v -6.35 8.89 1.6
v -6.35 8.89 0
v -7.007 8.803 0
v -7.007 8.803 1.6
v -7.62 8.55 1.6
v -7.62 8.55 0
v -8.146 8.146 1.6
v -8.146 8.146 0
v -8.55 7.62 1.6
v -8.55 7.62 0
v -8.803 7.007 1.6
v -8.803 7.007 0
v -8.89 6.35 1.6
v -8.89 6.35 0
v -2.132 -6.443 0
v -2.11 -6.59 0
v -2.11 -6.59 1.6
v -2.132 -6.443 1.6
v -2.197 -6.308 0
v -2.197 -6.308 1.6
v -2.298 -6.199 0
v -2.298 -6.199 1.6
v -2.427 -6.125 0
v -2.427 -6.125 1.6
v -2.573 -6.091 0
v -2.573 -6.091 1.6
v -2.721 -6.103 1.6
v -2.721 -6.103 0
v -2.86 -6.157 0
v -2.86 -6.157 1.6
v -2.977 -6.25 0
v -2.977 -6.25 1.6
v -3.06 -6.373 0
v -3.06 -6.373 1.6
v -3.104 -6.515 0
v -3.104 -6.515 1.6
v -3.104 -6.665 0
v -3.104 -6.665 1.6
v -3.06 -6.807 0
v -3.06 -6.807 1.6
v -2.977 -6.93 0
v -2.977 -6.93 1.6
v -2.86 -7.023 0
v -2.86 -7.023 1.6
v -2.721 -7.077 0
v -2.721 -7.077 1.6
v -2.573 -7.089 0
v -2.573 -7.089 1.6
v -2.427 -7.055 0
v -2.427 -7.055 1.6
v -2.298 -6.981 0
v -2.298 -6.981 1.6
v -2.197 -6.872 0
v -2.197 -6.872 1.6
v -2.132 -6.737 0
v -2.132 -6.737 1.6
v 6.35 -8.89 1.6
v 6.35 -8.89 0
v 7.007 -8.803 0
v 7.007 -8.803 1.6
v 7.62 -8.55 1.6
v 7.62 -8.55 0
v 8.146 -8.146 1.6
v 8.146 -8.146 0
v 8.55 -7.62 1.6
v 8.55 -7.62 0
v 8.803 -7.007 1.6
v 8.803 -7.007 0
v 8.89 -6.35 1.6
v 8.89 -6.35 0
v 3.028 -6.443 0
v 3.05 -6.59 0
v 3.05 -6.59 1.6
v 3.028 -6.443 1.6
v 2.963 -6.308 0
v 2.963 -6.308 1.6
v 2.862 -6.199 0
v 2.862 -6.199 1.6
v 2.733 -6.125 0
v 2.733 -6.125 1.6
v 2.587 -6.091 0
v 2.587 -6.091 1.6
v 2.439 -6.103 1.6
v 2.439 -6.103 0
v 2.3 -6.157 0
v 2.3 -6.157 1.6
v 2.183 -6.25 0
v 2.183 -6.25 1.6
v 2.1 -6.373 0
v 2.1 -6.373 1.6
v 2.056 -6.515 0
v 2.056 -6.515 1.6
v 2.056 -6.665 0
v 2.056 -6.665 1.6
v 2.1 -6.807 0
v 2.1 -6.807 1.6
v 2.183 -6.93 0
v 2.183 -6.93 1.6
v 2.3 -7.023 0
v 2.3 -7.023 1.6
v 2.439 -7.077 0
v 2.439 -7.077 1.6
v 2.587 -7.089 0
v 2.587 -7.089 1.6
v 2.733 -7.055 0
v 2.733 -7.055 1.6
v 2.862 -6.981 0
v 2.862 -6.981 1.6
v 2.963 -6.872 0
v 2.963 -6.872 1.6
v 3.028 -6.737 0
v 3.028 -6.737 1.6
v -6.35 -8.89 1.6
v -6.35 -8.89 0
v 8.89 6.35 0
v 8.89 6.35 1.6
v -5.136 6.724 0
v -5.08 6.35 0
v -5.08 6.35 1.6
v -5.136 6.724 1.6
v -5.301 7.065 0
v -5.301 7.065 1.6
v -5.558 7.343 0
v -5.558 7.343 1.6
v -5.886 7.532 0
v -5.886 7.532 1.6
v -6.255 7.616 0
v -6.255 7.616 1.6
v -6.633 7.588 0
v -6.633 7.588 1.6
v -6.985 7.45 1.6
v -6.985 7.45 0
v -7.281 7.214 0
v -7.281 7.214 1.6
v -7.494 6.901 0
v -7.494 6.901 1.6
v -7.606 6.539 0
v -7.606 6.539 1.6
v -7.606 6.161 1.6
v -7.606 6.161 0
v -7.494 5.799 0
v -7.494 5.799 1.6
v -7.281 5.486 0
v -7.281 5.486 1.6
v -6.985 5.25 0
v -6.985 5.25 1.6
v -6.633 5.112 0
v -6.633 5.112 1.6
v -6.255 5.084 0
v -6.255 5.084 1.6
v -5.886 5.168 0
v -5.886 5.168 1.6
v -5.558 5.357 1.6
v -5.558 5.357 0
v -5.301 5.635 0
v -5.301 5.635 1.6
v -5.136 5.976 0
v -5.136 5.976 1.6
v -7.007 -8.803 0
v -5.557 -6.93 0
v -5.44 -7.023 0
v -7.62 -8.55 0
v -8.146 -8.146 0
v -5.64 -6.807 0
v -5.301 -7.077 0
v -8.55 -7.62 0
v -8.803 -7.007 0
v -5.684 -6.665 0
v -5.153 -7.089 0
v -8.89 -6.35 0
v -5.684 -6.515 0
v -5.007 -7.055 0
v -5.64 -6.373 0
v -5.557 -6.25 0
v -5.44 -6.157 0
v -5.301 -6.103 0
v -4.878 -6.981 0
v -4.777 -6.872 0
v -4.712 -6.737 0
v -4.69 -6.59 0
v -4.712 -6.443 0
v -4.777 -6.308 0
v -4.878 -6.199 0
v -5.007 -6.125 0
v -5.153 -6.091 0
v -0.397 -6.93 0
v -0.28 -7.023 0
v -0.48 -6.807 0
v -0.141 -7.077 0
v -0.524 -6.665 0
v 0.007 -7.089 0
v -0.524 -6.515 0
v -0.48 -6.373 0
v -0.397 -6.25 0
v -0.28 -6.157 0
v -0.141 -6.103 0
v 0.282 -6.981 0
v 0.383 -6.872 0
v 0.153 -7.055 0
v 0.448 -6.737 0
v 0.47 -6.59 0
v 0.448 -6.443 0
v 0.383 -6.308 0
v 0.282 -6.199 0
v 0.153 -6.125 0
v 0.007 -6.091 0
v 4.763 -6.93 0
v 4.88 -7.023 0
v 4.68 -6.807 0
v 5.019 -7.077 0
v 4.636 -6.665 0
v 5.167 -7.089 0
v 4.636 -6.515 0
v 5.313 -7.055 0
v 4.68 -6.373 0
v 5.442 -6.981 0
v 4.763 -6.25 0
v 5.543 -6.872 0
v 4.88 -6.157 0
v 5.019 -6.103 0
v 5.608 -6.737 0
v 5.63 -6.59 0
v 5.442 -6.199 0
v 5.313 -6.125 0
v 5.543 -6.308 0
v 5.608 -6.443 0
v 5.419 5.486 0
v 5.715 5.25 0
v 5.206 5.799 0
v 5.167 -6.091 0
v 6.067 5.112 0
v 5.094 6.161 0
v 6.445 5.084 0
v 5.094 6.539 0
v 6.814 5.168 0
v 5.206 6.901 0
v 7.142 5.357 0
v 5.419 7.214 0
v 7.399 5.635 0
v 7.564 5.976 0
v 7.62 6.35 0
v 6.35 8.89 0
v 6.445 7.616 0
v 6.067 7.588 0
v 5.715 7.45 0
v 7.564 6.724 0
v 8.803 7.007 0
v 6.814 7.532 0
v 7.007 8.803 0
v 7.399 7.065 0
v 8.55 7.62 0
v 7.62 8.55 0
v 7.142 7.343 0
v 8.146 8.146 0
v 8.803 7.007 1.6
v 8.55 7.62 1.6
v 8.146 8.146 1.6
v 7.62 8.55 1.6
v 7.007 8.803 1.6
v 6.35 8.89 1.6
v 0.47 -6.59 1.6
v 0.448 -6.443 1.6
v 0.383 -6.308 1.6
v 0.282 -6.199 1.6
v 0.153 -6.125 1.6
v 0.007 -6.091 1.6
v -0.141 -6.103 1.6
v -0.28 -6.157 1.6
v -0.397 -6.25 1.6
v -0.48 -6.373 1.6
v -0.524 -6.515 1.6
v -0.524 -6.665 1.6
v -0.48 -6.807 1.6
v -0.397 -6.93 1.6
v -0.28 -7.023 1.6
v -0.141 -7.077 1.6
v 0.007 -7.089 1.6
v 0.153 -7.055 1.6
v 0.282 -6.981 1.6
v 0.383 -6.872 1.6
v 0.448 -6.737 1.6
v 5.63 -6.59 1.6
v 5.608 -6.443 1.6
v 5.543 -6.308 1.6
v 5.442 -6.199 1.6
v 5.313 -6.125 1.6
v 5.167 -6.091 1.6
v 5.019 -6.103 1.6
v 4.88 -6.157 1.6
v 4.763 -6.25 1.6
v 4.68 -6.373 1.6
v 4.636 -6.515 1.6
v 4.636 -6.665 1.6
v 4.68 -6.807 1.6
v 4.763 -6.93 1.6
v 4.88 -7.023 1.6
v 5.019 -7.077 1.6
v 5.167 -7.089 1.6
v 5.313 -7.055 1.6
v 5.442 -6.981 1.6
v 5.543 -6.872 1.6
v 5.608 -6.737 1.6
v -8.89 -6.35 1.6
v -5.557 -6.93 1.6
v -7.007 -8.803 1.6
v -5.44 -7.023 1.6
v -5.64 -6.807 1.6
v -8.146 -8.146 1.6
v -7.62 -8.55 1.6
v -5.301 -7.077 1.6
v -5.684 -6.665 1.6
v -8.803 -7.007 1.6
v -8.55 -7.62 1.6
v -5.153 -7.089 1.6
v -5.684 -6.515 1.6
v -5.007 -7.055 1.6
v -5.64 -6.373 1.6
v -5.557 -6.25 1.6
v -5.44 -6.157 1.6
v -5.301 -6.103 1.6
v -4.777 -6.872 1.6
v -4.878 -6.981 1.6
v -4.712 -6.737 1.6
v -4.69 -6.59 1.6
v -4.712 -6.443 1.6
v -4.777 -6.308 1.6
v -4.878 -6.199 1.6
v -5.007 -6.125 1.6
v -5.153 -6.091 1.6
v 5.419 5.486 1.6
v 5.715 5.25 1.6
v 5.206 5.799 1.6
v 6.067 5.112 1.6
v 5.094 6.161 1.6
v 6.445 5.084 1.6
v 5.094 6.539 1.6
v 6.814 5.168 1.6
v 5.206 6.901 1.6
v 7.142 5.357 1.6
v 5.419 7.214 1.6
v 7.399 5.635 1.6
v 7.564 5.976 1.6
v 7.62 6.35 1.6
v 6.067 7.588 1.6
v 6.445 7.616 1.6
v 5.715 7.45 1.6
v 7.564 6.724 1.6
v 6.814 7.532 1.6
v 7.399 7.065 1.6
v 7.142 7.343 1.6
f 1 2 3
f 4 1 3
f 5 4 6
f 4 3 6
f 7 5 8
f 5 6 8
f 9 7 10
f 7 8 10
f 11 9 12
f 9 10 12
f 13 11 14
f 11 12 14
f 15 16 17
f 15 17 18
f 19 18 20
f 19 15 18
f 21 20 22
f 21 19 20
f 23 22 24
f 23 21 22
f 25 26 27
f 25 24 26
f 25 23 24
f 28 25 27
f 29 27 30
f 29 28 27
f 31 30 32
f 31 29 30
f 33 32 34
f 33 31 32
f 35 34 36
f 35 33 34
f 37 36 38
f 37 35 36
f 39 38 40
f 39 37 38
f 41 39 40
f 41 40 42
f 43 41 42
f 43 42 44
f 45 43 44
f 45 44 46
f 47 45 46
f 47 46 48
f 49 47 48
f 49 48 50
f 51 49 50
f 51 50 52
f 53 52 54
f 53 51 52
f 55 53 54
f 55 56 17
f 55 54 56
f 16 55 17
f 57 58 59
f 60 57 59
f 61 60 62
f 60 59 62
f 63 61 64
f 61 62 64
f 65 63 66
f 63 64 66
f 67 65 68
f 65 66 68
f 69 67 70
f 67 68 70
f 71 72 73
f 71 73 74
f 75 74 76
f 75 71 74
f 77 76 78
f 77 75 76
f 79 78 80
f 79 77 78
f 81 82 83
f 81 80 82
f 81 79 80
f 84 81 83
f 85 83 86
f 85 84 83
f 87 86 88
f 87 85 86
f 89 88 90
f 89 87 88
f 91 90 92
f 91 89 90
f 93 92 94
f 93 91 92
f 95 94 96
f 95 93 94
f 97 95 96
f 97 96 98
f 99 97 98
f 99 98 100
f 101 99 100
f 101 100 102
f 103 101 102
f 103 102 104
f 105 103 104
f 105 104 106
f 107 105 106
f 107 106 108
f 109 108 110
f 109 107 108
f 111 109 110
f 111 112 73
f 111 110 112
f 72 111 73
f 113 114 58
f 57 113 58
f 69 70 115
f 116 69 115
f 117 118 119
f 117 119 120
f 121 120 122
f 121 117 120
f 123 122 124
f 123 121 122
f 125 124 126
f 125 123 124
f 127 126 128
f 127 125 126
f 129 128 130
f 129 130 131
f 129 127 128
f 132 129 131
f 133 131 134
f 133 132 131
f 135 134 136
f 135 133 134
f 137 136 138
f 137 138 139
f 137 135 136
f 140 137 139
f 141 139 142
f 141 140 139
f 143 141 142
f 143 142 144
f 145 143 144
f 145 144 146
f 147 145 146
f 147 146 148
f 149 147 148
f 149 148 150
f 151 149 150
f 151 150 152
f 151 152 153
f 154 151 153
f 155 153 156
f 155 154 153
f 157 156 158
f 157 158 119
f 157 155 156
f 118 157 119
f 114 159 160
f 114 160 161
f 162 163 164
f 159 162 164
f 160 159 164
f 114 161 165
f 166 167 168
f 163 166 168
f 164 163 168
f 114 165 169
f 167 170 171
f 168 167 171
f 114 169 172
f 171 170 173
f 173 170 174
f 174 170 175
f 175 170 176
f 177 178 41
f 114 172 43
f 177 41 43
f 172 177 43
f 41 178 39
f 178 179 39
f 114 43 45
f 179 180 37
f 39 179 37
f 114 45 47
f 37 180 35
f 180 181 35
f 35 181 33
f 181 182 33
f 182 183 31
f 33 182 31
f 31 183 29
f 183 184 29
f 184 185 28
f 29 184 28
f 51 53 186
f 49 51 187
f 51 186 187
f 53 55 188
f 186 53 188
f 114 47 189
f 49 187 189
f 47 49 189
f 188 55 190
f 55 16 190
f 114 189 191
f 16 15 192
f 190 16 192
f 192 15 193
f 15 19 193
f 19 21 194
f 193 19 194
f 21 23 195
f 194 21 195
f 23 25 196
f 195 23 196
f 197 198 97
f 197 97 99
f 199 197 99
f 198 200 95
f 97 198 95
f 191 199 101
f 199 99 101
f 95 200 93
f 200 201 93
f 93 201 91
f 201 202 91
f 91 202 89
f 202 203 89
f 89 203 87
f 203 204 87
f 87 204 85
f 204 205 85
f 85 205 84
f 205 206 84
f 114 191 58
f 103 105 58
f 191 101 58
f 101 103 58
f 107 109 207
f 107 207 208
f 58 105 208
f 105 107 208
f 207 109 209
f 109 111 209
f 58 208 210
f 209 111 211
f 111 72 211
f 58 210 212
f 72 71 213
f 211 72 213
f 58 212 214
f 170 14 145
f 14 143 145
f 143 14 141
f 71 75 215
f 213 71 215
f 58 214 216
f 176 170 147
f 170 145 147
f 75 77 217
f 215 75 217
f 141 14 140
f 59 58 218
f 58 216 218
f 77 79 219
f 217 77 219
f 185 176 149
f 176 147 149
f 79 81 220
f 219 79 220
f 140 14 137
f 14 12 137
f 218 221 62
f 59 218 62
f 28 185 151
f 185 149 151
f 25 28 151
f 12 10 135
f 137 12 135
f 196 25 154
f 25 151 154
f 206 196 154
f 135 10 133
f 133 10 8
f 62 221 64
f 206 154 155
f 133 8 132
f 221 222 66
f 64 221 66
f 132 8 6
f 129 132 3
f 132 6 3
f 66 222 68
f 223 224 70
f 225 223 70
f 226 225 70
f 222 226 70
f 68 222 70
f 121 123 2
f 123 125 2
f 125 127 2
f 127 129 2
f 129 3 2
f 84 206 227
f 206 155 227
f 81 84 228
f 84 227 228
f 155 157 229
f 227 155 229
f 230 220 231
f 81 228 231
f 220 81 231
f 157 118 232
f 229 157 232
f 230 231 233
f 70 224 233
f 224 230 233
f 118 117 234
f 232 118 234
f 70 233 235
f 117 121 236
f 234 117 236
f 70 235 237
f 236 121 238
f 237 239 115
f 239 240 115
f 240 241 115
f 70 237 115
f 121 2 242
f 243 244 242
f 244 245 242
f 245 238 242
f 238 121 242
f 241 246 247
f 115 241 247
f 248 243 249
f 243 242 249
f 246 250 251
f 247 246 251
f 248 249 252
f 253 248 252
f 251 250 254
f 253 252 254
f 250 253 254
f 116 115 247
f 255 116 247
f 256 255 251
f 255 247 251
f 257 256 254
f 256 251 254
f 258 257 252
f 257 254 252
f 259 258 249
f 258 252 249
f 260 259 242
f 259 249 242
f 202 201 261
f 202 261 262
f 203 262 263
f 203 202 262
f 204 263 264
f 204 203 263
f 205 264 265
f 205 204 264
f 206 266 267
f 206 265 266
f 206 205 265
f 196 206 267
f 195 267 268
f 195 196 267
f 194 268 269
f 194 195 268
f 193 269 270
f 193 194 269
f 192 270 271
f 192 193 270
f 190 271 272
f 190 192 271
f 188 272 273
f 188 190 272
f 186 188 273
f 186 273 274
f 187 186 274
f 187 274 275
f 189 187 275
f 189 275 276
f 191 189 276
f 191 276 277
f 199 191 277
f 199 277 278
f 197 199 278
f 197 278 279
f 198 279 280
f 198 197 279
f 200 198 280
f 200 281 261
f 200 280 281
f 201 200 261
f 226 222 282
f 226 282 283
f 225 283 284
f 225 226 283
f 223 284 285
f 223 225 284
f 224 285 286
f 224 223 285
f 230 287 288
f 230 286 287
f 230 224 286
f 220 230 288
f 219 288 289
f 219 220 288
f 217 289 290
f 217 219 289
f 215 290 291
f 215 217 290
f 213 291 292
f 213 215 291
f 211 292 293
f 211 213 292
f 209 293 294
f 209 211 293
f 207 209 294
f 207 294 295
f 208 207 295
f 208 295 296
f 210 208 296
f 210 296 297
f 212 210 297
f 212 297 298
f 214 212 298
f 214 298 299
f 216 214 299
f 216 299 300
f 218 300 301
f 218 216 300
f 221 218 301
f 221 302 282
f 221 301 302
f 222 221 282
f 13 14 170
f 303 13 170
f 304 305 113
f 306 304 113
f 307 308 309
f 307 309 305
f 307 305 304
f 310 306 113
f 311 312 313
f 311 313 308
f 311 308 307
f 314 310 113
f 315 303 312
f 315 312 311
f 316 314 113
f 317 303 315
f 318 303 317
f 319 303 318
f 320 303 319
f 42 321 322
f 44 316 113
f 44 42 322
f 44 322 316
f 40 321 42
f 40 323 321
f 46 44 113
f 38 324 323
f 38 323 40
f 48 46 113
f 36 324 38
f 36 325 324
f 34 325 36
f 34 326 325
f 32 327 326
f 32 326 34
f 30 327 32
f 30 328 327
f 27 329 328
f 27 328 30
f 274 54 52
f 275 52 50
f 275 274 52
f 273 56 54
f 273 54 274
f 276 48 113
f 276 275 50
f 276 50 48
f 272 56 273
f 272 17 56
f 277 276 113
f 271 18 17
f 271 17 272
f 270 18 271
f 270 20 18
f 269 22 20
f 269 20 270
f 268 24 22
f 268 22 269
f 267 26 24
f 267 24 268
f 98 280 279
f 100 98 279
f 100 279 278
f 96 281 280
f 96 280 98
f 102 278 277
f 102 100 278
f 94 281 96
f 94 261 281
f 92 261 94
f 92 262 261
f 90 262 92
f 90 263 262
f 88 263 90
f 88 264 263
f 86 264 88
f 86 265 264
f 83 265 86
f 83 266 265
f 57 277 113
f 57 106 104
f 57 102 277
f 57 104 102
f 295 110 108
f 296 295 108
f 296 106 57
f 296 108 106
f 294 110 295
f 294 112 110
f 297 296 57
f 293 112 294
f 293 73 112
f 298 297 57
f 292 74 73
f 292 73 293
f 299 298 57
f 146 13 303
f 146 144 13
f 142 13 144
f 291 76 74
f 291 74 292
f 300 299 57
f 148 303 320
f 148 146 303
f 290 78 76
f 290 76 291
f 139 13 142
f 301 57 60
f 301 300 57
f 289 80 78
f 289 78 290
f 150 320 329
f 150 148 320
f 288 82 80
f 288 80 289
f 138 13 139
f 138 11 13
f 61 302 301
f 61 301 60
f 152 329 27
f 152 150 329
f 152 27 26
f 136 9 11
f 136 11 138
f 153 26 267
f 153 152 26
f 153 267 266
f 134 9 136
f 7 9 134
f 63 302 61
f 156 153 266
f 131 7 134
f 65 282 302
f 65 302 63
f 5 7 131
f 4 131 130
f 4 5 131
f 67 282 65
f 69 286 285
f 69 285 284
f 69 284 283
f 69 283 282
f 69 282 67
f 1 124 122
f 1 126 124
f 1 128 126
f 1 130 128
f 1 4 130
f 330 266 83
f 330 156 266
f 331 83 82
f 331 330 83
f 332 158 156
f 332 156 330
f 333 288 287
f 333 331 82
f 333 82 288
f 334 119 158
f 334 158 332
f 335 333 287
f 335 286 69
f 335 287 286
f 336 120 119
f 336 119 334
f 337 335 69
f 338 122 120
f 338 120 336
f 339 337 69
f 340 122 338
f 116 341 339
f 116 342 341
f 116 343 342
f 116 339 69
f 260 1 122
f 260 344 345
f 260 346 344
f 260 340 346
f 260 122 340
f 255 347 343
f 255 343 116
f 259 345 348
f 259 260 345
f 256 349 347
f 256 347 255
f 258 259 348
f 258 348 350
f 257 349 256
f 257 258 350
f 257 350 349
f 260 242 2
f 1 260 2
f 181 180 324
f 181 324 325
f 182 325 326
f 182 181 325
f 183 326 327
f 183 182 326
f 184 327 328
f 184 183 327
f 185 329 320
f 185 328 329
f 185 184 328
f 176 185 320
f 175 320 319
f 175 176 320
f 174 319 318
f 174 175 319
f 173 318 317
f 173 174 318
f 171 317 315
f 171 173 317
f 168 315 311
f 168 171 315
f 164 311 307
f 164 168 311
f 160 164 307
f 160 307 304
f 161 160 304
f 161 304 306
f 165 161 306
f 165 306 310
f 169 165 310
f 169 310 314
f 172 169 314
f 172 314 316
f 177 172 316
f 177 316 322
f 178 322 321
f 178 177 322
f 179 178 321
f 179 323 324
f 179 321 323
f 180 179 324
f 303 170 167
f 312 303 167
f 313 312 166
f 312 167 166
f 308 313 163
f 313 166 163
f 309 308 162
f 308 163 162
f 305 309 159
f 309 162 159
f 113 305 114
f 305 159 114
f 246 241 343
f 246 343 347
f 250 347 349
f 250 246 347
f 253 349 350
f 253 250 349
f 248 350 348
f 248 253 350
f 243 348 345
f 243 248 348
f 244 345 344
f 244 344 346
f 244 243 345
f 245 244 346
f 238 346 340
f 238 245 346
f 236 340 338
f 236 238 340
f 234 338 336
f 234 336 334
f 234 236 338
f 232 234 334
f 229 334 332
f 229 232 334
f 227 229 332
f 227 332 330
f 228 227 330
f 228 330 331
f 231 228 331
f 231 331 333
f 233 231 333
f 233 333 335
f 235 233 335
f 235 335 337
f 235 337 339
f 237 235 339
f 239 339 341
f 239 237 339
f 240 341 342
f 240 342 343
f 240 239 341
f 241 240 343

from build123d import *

# Parameters (mm, degrees)
SKETCH2_R               = 1.27
BOSS_EXTRUDE1_DEPTH     = 1.6
CUT_EXTRUDE1_DEPTH      = 13.673760294
CUT_EXTRUDE1_DEPTH_BACK = 13.673760294
SKETCH3_R               = 0.5


with BuildPart() as part:
    # Sketch2 → Boss-Extrude1 (new body)
    with BuildSketch(Plane.XY):
        with BuildLine():
            Line((-6.35, -8.89), (6.35, -8.89))
            ThreePointArc((6.35, -8.89), (8.146051224, -8.146051224), (8.89, -6.35))
            Line((8.89, -6.35), (8.89, 6.35))
            ThreePointArc((8.89, 6.35), (8.146051224, 8.146051224), (6.35, 8.89))
            Line((6.35, 8.89), (-6.35, 8.89))
            ThreePointArc((-6.35, 8.89), (-8.146051224, 8.146051224), (-8.89, 6.35))
            Line((-8.89, 6.35), (-8.89, -6.35))
            ThreePointArc((-8.89, -6.35), (-8.146051224, -8.146051224), (-6.35, -8.89))
        make_face()
        with Locations((-6.35, 6.35)):
            Circle(SKETCH2_R, mode=Mode.SUBTRACT)
        with Locations((6.35, 6.35)):
            Circle(SKETCH2_R, mode=Mode.SUBTRACT)
    extrude(amount=BOSS_EXTRUDE1_DEPTH)

    # Sketch3 → Cut-Extrude1 (cut, two sides: drawn at the far end of the back side and taken through both)
    with BuildSketch(Plane.XY.offset(1.6).offset(-CUT_EXTRUDE1_DEPTH_BACK)):
        with Locations((-5.19, -6.59)):
            Circle(SKETCH3_R)
        with Locations((-2.61, -6.59)):
            Circle(SKETCH3_R)
        with Locations((-0.03, -6.59)):
            Circle(SKETCH3_R)
        with Locations((2.55, -6.59)):
            Circle(SKETCH3_R)
        with Locations((5.13, -6.59)):
            Circle(SKETCH3_R)
    extrude(amount=CUT_EXTRUDE1_DEPTH + CUT_EXTRUDE1_DEPTH_BACK, mode=Mode.SUBTRACT)


solid = part.part
